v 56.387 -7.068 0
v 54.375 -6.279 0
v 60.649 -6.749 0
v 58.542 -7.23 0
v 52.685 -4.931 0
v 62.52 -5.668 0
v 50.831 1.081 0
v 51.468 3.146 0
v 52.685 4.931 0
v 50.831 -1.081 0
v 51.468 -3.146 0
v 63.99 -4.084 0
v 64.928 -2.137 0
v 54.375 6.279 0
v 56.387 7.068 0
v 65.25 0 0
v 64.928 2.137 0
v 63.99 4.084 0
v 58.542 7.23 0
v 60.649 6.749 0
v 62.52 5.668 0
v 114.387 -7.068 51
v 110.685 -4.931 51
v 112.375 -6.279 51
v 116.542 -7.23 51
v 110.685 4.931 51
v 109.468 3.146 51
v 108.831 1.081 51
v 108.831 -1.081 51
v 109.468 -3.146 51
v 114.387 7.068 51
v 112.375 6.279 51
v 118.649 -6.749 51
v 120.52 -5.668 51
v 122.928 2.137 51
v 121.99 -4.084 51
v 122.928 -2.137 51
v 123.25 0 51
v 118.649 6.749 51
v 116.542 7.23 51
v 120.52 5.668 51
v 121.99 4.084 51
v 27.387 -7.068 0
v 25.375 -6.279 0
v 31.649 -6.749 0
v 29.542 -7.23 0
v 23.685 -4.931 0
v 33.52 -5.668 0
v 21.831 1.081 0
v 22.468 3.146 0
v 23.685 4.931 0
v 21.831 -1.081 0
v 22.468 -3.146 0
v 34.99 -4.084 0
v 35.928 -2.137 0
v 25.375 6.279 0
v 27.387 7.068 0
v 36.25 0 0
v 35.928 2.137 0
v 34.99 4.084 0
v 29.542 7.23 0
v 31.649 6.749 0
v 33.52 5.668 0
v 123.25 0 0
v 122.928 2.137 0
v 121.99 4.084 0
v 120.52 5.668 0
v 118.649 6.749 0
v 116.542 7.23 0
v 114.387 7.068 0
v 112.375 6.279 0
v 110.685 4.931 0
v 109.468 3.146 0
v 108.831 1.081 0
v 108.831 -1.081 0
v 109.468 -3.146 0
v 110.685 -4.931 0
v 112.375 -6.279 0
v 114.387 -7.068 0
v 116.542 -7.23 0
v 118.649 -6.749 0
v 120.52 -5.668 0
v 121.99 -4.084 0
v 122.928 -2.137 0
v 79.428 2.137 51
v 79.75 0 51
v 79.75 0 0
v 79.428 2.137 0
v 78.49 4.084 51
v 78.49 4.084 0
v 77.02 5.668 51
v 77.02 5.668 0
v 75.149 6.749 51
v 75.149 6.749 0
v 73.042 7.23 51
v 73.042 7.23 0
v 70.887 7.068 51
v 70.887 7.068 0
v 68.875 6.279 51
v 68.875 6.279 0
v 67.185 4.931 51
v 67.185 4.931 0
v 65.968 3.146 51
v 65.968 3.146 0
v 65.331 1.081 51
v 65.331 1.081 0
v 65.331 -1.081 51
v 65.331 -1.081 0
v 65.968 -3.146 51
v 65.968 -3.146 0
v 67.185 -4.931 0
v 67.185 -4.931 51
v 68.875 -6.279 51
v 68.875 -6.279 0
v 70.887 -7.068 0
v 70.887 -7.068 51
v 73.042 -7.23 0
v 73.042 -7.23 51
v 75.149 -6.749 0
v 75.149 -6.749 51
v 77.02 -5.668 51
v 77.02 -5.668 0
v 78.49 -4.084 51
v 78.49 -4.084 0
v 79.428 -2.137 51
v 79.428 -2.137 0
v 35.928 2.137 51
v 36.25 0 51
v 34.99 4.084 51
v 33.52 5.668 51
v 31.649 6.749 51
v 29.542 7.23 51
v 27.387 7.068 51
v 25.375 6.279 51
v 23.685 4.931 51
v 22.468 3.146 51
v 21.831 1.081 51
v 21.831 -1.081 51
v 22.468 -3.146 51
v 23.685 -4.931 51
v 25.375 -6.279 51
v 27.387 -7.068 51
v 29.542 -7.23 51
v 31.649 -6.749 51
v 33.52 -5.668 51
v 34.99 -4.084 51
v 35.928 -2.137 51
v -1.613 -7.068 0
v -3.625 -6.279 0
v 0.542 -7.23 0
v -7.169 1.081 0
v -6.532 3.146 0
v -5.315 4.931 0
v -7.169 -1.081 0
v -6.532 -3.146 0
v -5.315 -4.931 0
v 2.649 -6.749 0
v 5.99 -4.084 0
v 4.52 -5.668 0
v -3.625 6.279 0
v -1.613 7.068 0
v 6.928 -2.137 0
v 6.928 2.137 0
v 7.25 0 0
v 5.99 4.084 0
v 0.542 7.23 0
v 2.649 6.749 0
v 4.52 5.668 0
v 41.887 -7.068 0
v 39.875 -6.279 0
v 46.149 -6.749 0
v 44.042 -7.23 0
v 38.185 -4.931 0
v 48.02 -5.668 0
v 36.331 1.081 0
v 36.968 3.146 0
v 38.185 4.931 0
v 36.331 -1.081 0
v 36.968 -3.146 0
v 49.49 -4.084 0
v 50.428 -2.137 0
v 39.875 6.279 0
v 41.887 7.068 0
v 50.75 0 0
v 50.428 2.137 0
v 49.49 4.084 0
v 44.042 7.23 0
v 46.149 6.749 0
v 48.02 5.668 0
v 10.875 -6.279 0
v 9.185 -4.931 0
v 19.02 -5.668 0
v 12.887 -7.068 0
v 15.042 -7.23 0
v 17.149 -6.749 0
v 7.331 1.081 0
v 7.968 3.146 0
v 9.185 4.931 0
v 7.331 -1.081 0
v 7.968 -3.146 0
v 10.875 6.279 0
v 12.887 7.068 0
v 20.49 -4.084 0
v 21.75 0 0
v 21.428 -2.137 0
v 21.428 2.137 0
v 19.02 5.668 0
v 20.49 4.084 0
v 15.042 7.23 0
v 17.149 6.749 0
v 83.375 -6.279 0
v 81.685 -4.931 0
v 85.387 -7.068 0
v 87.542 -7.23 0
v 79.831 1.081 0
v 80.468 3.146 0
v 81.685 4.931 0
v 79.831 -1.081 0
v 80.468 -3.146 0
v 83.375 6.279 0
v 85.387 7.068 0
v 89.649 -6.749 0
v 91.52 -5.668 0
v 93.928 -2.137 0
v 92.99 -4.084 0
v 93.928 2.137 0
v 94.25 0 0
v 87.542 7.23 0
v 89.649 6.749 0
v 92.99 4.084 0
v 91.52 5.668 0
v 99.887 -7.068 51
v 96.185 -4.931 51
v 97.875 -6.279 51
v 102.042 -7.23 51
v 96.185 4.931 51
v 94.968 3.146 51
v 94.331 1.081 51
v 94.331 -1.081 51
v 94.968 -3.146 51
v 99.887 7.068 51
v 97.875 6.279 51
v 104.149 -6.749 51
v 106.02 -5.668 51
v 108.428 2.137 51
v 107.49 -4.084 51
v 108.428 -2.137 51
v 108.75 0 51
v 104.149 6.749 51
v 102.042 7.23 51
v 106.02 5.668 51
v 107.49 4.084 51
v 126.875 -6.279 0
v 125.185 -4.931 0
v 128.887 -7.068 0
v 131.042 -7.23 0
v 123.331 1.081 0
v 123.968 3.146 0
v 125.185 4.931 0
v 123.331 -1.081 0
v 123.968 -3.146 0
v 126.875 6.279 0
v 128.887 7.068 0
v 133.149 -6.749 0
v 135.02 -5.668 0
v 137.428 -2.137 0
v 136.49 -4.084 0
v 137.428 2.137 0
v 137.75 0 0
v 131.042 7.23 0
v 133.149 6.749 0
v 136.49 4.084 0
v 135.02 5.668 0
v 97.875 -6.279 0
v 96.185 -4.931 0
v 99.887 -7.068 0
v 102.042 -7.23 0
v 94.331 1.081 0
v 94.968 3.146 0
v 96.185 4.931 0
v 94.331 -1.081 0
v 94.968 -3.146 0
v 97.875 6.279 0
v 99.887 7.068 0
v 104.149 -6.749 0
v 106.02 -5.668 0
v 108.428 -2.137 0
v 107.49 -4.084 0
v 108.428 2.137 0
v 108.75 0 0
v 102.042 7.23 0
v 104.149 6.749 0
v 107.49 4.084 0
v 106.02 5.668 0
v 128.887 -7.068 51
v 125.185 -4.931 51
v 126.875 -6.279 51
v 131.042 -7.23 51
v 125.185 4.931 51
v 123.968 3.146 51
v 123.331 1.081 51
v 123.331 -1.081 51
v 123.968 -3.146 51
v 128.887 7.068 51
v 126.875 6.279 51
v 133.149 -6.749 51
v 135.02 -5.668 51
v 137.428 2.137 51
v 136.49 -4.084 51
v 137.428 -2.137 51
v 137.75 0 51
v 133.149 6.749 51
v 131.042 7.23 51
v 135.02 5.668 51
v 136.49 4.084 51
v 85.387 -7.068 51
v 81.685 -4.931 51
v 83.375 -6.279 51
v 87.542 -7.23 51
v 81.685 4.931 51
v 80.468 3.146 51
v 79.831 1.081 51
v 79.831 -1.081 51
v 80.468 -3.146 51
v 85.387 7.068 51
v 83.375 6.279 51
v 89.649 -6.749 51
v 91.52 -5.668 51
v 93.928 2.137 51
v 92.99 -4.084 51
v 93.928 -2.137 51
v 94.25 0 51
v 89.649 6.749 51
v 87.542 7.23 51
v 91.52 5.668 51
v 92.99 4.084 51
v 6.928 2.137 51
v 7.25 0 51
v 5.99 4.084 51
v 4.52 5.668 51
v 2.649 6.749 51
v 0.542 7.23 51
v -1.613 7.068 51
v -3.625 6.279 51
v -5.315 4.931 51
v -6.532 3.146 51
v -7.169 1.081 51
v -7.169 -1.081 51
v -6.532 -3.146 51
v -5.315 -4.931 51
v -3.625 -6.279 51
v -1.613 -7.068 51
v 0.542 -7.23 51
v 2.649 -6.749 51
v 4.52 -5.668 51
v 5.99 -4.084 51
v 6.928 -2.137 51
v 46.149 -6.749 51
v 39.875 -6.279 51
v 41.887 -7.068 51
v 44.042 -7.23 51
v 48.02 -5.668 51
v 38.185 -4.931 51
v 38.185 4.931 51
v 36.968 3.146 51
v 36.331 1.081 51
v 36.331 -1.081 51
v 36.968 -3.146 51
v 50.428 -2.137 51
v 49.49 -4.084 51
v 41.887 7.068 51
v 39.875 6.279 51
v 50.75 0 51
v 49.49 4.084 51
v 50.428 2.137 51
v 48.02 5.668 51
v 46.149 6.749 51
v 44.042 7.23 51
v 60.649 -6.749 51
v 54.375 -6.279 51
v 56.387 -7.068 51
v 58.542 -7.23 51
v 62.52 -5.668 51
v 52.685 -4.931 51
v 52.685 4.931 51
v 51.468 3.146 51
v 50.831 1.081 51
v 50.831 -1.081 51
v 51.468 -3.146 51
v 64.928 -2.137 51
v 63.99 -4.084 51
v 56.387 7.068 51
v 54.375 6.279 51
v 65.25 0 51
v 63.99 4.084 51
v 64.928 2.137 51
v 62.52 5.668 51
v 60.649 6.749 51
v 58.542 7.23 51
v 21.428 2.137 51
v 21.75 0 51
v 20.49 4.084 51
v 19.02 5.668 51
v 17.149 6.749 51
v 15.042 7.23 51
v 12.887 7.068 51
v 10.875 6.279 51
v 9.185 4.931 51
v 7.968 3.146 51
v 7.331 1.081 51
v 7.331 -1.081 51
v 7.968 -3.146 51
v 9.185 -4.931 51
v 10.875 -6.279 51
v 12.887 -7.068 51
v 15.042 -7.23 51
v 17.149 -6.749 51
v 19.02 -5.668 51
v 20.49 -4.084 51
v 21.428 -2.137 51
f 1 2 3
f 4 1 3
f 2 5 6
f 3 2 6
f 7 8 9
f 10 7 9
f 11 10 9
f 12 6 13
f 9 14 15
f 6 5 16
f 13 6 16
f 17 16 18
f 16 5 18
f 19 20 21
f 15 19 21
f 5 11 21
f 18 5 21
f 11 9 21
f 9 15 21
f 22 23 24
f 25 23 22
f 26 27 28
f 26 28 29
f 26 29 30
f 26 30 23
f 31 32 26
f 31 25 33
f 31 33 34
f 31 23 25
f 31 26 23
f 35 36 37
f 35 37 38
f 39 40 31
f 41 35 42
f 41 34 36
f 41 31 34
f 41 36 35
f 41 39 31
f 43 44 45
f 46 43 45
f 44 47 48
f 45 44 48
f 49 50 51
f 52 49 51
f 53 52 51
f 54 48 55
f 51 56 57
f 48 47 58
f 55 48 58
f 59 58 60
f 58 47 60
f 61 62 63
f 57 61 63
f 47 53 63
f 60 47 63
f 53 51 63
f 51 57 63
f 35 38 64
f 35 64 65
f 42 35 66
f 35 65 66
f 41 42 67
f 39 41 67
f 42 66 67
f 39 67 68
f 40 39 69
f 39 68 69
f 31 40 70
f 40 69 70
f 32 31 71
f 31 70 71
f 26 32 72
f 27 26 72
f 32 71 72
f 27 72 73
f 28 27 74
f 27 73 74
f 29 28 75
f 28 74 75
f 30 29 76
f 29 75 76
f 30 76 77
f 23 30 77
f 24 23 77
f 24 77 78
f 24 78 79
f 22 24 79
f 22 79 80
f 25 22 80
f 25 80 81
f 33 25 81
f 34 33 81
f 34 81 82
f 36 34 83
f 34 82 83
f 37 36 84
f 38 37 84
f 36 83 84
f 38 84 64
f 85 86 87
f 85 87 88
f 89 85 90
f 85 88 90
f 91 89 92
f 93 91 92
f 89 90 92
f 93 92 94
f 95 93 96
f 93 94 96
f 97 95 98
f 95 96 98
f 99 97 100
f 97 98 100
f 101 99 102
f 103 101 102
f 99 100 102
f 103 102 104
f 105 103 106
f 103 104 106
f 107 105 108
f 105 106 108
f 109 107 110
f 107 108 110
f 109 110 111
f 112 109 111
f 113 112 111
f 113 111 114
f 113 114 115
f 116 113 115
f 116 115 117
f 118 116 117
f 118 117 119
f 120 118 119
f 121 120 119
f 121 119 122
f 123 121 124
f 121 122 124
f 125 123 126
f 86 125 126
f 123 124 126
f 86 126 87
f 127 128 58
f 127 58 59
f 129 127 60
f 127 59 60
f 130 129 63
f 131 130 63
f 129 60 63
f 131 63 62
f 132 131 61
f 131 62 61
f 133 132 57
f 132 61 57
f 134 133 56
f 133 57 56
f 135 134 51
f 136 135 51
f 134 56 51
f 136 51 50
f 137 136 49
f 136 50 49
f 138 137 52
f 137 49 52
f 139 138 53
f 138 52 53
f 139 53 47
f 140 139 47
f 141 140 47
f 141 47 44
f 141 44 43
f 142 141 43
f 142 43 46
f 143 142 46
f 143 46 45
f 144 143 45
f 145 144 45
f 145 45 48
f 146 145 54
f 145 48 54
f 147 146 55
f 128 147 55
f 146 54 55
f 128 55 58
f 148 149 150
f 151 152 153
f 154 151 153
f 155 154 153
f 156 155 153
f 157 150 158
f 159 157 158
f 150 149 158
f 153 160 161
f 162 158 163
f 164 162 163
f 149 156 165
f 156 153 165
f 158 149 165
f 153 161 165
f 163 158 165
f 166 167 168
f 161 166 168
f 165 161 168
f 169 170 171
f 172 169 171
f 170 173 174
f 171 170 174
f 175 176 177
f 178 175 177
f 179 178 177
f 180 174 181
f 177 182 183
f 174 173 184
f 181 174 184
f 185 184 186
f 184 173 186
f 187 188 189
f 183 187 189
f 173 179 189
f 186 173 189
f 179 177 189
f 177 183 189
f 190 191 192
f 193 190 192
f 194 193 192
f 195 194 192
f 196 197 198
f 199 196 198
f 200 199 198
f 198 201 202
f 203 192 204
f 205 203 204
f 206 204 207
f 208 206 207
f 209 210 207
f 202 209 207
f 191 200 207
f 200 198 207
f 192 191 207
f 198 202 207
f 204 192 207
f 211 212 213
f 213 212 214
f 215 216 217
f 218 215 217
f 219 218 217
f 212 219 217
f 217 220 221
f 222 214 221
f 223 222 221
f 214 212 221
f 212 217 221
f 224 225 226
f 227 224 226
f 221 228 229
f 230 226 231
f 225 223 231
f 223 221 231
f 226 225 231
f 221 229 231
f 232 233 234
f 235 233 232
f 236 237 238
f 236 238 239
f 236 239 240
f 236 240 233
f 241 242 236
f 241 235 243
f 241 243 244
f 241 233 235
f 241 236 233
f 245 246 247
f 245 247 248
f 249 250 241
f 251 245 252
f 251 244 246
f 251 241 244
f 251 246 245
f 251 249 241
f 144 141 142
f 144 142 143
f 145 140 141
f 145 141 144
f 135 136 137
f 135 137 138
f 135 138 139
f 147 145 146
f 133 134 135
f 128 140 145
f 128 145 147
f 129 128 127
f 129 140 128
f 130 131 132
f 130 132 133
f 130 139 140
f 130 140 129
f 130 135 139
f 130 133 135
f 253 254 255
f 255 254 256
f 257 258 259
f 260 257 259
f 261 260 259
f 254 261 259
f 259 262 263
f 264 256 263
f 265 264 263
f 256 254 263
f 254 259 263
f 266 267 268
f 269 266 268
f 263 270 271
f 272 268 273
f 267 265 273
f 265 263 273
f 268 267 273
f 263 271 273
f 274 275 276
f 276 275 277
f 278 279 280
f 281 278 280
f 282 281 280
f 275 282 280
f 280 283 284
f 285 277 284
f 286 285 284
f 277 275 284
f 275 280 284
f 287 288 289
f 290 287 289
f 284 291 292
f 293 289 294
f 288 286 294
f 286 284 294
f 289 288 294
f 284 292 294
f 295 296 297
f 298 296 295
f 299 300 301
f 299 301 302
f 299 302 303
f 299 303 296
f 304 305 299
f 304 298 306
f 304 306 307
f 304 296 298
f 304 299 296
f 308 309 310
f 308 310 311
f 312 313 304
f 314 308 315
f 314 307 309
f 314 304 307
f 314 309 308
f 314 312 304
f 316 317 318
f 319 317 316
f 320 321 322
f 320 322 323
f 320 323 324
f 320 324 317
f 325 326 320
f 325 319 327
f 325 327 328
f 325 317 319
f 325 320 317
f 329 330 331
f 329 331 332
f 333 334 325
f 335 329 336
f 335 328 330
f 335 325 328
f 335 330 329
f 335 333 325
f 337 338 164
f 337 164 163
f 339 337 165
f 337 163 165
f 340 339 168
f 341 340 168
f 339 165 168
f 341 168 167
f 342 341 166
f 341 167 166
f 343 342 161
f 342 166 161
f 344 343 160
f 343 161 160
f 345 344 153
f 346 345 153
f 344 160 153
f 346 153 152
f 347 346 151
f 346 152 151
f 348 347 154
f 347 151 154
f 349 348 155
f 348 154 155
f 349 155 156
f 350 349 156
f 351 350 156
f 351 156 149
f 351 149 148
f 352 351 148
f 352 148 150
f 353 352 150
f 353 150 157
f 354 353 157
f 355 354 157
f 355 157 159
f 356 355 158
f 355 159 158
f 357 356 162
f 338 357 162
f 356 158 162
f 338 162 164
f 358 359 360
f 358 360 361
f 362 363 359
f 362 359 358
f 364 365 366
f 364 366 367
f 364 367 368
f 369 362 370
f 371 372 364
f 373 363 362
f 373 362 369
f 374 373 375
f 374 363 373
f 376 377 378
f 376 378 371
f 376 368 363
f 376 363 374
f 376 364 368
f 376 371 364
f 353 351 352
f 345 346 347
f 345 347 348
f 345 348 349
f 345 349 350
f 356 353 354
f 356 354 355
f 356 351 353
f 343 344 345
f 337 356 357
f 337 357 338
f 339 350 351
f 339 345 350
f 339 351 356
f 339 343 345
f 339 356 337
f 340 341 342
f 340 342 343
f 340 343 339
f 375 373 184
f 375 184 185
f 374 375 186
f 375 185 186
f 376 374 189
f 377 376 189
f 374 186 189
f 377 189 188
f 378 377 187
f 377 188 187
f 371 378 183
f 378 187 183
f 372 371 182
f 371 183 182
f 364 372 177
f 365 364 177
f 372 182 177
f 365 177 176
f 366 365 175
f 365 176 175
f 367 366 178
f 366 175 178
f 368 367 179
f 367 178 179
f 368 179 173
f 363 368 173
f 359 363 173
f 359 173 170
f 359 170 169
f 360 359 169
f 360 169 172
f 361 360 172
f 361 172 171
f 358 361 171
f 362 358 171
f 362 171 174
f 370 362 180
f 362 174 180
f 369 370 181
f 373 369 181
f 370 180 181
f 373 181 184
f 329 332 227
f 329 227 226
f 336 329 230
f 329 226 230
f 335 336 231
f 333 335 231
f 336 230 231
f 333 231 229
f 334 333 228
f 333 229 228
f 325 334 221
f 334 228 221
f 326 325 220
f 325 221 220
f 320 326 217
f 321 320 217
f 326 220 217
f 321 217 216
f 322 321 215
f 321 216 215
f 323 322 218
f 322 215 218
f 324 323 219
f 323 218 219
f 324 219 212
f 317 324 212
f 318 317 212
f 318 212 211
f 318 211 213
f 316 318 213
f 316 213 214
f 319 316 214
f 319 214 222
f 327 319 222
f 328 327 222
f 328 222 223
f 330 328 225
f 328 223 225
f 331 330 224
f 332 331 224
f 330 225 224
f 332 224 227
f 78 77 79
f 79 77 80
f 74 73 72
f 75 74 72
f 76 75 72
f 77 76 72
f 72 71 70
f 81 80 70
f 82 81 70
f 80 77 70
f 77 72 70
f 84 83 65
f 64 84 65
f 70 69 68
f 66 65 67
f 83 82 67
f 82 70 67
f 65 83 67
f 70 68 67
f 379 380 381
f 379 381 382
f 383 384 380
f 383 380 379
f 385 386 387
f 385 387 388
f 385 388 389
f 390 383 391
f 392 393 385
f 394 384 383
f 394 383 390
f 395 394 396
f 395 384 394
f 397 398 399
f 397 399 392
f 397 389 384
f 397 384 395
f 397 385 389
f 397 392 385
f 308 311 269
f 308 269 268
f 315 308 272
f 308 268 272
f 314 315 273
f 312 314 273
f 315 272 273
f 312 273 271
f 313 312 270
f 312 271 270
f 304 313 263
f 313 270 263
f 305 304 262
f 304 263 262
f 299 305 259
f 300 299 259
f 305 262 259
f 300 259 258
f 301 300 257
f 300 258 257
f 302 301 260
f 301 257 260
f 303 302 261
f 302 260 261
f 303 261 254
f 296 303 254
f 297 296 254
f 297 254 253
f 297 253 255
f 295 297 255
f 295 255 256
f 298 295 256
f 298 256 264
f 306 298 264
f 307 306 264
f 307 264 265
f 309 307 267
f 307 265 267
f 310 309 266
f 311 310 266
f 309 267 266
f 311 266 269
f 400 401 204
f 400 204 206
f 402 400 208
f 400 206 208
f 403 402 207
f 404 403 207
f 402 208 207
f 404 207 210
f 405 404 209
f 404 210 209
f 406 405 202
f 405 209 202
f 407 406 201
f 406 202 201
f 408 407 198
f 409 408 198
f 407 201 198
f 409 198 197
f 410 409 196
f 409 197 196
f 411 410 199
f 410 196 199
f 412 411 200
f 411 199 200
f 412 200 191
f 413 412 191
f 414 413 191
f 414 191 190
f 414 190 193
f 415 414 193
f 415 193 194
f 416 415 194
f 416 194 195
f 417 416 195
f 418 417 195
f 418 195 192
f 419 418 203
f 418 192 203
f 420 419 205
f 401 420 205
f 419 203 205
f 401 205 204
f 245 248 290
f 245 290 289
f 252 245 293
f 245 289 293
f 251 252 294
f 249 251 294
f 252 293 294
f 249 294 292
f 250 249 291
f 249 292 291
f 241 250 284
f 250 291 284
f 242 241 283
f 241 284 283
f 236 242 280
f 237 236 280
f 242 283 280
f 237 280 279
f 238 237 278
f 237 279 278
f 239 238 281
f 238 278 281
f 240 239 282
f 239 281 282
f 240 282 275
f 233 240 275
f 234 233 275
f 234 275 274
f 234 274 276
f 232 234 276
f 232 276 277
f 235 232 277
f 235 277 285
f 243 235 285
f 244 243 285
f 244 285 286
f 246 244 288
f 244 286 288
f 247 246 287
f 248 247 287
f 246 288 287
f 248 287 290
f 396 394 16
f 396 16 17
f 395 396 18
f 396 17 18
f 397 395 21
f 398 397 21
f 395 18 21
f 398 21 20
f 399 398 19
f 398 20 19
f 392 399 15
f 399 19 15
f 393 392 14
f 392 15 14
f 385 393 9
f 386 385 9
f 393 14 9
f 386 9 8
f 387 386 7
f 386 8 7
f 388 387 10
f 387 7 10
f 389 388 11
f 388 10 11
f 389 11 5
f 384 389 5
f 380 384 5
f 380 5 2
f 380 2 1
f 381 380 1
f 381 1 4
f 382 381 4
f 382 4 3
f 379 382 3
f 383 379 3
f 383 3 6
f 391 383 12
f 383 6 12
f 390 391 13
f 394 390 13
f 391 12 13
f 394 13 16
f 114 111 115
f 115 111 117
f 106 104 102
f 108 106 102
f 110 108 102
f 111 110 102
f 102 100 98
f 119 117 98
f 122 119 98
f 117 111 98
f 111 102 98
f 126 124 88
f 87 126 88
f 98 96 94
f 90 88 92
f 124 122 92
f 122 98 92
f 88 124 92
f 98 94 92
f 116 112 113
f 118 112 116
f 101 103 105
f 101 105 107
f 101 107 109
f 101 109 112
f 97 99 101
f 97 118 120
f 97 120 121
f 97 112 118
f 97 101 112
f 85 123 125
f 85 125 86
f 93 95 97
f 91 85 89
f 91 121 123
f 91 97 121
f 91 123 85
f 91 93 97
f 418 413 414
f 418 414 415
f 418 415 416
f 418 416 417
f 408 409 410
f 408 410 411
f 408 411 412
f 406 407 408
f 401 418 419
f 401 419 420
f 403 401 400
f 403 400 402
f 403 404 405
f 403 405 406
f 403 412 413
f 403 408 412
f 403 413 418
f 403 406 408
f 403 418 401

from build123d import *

# Parameters (mm, degrees)
ESQUISSE1_R           = 7.25
BOSS_EXTRU_1_DEPTH    = 51
BOSS_EXTRU_1_2_DEPTH  = 51
BOSS_EXTRU_1_3_DEPTH  = 51
BOSS_EXTRU_1_4_DEPTH  = 51
BOSS_EXTRU_1_5_DEPTH  = 51
BOSS_EXTRU_1_6_DEPTH  = 51
BOSS_EXTRU_1_7_DEPTH  = 51
BOSS_EXTRU_1_8_DEPTH  = 51
BOSS_EXTRU_1_9_DEPTH  = 51
BOSS_EXTRU_1_10_DEPTH = 51


with BuildPart() as part:
    # Esquisse1 → Boss.-Extru.1 (new body)
    with BuildSketch(Plane.XY):
        with Locations((14.5, 0)):
            Circle(ESQUISSE1_R)
    extrude(amount=BOSS_EXTRU_1_DEPTH)


with BuildPart() as body_2:
    # Esquisse1 → Boss.-Extru.1 2 (new body)
    with BuildSketch(Plane.XY):
        with Locations((29, 0)):
            Circle(ESQUISSE1_R)
    extrude(amount=BOSS_EXTRU_1_2_DEPTH)


with BuildPart() as body_3:
    # Esquisse1 → Boss.-Extru.1 3 (new body)
    with BuildSketch(Plane.XY):
        with Locations((43.5, 0)):
            Circle(ESQUISSE1_R)
    extrude(amount=BOSS_EXTRU_1_3_DEPTH)


with BuildPart() as body_4:
    # Esquisse1 → Boss.-Extru.1 4 (new body)
    with BuildSketch(Plane.XY):
        Circle(ESQUISSE1_R)
    extrude(amount=BOSS_EXTRU_1_4_DEPTH)


with BuildPart() as body_5:
    # Esquisse1 → Boss.-Extru.1 5 (new body)
    with BuildSketch(Plane.XY):
        with Locations((58, 0)):
            Circle(ESQUISSE1_R)
    extrude(amount=BOSS_EXTRU_1_5_DEPTH)


with BuildPart() as body_6:
    # Esquisse1 → Boss.-Extru.1 6 (new body)
    with BuildSketch(Plane.XY):
        with Locations((72.5, 0)):
            Circle(ESQUISSE1_R)
    extrude(amount=BOSS_EXTRU_1_6_DEPTH)


with BuildPart() as body_7:
    # Esquisse1 → Boss.-Extru.1 7 (new body)
    with BuildSketch(Plane.XY):
        with Locations((87, 0)):
            Circle(ESQUISSE1_R)
    extrude(amount=BOSS_EXTRU_1_7_DEPTH)


with BuildPart() as body_8:
    # Esquisse1 → Boss.-Extru.1 8 (new body)
    with BuildSketch(Plane.XY):
        with Locations((101.5, 0)):
            Circle(ESQUISSE1_R)
    extrude(amount=BOSS_EXTRU_1_8_DEPTH)


with BuildPart() as body_9:
    # Esquisse1 → Boss.-Extru.1 9 (new body)
    with BuildSketch(Plane.XY):
        with Locations((116, 0)):
            Circle(ESQUISSE1_R)
    extrude(amount=BOSS_EXTRU_1_9_DEPTH)


with BuildPart() as body_10:
    # Esquisse1 → Boss.-Extru.1 10 (new body)
    with BuildSketch(Plane.XY):
        with Locations((130.5, 0)):
            Circle(ESQUISSE1_R)
    extrude(amount=BOSS_EXTRU_1_10_DEPTH)


solid = Compound([part.part, body_2.part, body_3.part, body_4.part, body_5.part, body_6.part, body_7.part, body_8.part, body_9.part, body_10.part])
